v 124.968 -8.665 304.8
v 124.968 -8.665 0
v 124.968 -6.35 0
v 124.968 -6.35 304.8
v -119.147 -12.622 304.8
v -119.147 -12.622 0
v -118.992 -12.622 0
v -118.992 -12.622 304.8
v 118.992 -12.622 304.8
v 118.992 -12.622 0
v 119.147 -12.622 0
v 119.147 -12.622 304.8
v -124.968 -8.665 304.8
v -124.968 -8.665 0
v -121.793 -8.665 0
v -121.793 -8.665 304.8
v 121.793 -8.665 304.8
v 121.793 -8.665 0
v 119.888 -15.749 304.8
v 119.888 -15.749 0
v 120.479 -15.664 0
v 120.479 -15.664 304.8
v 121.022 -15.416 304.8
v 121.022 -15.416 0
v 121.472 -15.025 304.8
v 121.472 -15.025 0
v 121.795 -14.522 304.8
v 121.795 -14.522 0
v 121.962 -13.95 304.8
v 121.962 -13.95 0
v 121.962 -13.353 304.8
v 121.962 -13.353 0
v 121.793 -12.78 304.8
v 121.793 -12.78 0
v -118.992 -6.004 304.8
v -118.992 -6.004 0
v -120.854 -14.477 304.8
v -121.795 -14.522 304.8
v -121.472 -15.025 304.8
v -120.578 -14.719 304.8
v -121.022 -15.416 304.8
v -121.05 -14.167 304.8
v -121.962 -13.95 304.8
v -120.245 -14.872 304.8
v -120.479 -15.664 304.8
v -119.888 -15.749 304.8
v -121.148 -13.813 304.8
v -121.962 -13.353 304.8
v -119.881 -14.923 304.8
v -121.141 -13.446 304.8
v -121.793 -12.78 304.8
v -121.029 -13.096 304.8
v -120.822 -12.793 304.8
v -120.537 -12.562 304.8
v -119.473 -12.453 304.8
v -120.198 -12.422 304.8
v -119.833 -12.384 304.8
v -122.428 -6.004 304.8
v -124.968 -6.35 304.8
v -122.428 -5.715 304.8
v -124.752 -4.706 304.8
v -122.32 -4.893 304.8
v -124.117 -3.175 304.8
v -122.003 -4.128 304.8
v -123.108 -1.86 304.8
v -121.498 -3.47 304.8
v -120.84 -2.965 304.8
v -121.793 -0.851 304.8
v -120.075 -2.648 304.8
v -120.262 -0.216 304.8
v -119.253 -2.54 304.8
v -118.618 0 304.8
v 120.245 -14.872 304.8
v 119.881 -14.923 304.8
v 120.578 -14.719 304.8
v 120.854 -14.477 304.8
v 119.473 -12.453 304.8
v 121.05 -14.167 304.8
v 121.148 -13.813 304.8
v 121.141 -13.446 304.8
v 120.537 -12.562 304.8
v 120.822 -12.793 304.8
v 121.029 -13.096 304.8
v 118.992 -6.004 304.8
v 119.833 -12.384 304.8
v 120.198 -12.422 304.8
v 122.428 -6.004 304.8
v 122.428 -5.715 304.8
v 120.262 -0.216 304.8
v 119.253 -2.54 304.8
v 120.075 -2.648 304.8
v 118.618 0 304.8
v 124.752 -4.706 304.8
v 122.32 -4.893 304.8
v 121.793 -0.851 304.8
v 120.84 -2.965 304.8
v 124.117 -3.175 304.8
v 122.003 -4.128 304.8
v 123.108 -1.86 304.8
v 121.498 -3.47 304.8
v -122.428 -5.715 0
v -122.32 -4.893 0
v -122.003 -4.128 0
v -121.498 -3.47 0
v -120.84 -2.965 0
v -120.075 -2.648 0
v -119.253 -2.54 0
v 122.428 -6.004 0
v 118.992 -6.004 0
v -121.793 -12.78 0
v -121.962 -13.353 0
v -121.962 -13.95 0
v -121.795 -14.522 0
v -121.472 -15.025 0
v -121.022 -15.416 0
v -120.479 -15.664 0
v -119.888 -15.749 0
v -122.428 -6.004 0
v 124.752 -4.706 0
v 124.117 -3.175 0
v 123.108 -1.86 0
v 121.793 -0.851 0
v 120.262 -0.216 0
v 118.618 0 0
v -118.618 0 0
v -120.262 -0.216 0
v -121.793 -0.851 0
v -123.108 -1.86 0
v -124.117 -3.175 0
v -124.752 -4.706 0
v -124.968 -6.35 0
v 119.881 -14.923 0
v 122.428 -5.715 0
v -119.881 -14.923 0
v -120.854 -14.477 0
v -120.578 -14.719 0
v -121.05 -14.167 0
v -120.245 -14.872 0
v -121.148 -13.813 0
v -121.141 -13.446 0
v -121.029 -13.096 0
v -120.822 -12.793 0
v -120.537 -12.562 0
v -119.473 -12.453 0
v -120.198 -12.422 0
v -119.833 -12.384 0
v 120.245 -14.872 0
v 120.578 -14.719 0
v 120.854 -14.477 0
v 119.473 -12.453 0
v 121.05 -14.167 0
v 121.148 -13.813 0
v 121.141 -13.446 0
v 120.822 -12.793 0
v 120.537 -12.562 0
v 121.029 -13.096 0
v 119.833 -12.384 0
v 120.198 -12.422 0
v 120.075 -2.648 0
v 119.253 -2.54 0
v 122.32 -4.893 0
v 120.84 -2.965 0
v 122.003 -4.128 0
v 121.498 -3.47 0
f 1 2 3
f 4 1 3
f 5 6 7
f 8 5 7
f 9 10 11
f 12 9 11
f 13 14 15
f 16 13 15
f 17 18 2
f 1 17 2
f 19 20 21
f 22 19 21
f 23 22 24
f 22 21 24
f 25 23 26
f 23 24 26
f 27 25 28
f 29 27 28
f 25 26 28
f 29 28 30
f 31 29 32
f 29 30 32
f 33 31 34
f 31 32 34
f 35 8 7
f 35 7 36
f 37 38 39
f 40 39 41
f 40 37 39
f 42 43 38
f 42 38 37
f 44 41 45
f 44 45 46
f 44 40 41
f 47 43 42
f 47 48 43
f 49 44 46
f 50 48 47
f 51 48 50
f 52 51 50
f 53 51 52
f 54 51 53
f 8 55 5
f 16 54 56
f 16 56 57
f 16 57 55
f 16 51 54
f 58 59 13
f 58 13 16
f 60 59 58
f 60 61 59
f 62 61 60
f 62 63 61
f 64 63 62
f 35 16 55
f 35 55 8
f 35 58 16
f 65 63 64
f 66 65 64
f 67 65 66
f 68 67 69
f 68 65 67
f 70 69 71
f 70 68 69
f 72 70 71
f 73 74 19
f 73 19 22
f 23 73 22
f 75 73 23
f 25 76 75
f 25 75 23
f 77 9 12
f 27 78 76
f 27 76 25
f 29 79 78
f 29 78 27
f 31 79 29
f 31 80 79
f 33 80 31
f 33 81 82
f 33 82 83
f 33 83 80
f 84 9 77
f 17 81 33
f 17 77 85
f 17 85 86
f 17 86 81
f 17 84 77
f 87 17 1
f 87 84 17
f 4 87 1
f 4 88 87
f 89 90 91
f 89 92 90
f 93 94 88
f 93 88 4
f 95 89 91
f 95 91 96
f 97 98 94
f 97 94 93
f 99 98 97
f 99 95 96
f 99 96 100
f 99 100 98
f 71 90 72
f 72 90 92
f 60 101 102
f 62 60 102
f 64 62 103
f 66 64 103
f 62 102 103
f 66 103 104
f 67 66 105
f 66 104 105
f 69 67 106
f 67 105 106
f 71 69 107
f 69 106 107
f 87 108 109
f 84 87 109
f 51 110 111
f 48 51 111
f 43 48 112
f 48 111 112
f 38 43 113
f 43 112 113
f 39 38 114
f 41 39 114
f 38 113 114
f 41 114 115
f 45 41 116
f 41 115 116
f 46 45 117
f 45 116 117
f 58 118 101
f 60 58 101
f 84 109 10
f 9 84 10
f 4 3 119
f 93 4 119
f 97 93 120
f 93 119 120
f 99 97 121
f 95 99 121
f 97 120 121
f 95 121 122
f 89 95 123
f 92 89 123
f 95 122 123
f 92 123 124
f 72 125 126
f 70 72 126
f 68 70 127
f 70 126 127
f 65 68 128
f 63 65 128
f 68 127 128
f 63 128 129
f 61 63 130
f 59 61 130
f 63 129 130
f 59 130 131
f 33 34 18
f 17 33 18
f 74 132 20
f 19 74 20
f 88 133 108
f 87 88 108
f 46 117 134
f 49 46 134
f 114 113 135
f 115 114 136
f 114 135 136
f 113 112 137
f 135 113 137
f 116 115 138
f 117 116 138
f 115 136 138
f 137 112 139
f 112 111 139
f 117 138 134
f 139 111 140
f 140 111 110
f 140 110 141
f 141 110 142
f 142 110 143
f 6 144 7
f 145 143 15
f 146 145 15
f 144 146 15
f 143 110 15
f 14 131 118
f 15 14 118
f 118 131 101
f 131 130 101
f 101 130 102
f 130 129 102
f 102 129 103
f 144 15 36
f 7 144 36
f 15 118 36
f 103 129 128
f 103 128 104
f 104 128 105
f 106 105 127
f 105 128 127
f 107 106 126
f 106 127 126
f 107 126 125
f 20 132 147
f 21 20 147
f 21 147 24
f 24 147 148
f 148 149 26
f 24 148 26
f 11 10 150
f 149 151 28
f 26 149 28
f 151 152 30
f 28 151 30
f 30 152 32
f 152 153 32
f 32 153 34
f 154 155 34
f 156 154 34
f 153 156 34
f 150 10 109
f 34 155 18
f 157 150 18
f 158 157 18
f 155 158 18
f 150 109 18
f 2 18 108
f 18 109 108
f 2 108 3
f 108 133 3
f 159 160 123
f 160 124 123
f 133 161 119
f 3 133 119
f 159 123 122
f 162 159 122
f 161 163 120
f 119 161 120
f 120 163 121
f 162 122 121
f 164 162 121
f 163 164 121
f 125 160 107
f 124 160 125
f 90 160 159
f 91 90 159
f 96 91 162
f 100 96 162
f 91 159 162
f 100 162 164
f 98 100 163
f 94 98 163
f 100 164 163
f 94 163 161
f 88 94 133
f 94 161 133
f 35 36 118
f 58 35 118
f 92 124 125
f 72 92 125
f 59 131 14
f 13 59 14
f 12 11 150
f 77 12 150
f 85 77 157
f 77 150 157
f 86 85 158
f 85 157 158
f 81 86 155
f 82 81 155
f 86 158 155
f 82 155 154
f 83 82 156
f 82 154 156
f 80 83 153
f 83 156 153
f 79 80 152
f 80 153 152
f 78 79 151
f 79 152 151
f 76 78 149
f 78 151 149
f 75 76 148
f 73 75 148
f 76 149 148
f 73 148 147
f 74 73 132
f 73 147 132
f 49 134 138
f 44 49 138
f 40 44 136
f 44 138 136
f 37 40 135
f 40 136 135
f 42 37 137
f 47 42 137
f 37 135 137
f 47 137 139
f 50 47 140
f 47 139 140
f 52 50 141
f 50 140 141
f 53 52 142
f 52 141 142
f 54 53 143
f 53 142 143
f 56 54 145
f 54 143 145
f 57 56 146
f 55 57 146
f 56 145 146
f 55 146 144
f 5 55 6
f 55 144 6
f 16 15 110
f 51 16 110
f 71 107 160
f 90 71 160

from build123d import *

# Parameters (mm, degrees)
MAINBODY_DEPTH = 304.8


with BuildPart() as part:
    # Sketch2 → MainBody (new body)
    with BuildSketch(Plane.XY):
        with BuildLine():
            Line((-119.888, -15.748740175), (-119.881210728, -14.923222028))
            ThreePointArc((-119.881210728, -14.923222028), (-121.097875098, -13.267102575), (-119.146762684, -12.621994695))
            Line((-119.146762684, -12.621994695), (-118.992266474, -12.621994695))
            Line((-118.992266474, -12.621994695), (-118.992266474, -6.004220787))
            Line((-118.992266474, -6.004220787), (-122.428, -6.004220787))
            Line((-122.428, -6.004220787), (-122.428, -5.715))
            ThreePointArc((-122.428, -5.715), (-121.49806403, -3.46993597), (-119.253, -2.54))
            Line((-119.253, -2.54), (119.253, -2.54))
            ThreePointArc((119.253, -2.54), (121.49806403, -3.46993597), (122.428, -5.715))
            Line((122.428, -5.715), (122.428, -6.004220787))
            Line((122.428, -6.004220787), (118.992266474, -6.004220787))
            Line((118.992266474, -6.004220787), (118.992266474, -12.621994695))
            Line((118.992266474, -12.621994695), (119.146762684, -12.621994695))
            ThreePointArc((119.146762684, -12.621994695), (121.097875098, -13.267102575), (119.881210728, -14.923222028))
            Line((119.881210728, -14.923222028), (119.888, -15.748740175))
            ThreePointArc((119.888, -15.748740175), (121.651583177, -14.78500633), (121.793, -12.780259505))
            Line((121.793, -12.780259505), (121.793, -8.665459505))
            Line((121.793, -8.665459505), (124.968, -8.665459505))
            Line((124.968, -8.665459505), (124.968, -6.35))
            ThreePointArc((124.968, -6.35), (123.108128061, -1.859871939), (118.618, 0))
            Line((118.618, 0), (-118.618, 0))
            ThreePointArc((-118.618, 0), (-123.108128061, -1.859871939), (-124.968, -6.35))
            Line((-124.968, -6.35), (-124.968, -8.665459505))
            Line((-124.968, -8.665459505), (-121.793, -8.665459505))
            Line((-121.793, -8.665459505), (-121.793, -12.780259505))
            ThreePointArc((-121.793, -12.780259505), (-121.651583177, -14.78500633), (-119.888, -15.748740175))
        make_face()
    extrude(amount=MAINBODY_DEPTH)


solid = part.part
